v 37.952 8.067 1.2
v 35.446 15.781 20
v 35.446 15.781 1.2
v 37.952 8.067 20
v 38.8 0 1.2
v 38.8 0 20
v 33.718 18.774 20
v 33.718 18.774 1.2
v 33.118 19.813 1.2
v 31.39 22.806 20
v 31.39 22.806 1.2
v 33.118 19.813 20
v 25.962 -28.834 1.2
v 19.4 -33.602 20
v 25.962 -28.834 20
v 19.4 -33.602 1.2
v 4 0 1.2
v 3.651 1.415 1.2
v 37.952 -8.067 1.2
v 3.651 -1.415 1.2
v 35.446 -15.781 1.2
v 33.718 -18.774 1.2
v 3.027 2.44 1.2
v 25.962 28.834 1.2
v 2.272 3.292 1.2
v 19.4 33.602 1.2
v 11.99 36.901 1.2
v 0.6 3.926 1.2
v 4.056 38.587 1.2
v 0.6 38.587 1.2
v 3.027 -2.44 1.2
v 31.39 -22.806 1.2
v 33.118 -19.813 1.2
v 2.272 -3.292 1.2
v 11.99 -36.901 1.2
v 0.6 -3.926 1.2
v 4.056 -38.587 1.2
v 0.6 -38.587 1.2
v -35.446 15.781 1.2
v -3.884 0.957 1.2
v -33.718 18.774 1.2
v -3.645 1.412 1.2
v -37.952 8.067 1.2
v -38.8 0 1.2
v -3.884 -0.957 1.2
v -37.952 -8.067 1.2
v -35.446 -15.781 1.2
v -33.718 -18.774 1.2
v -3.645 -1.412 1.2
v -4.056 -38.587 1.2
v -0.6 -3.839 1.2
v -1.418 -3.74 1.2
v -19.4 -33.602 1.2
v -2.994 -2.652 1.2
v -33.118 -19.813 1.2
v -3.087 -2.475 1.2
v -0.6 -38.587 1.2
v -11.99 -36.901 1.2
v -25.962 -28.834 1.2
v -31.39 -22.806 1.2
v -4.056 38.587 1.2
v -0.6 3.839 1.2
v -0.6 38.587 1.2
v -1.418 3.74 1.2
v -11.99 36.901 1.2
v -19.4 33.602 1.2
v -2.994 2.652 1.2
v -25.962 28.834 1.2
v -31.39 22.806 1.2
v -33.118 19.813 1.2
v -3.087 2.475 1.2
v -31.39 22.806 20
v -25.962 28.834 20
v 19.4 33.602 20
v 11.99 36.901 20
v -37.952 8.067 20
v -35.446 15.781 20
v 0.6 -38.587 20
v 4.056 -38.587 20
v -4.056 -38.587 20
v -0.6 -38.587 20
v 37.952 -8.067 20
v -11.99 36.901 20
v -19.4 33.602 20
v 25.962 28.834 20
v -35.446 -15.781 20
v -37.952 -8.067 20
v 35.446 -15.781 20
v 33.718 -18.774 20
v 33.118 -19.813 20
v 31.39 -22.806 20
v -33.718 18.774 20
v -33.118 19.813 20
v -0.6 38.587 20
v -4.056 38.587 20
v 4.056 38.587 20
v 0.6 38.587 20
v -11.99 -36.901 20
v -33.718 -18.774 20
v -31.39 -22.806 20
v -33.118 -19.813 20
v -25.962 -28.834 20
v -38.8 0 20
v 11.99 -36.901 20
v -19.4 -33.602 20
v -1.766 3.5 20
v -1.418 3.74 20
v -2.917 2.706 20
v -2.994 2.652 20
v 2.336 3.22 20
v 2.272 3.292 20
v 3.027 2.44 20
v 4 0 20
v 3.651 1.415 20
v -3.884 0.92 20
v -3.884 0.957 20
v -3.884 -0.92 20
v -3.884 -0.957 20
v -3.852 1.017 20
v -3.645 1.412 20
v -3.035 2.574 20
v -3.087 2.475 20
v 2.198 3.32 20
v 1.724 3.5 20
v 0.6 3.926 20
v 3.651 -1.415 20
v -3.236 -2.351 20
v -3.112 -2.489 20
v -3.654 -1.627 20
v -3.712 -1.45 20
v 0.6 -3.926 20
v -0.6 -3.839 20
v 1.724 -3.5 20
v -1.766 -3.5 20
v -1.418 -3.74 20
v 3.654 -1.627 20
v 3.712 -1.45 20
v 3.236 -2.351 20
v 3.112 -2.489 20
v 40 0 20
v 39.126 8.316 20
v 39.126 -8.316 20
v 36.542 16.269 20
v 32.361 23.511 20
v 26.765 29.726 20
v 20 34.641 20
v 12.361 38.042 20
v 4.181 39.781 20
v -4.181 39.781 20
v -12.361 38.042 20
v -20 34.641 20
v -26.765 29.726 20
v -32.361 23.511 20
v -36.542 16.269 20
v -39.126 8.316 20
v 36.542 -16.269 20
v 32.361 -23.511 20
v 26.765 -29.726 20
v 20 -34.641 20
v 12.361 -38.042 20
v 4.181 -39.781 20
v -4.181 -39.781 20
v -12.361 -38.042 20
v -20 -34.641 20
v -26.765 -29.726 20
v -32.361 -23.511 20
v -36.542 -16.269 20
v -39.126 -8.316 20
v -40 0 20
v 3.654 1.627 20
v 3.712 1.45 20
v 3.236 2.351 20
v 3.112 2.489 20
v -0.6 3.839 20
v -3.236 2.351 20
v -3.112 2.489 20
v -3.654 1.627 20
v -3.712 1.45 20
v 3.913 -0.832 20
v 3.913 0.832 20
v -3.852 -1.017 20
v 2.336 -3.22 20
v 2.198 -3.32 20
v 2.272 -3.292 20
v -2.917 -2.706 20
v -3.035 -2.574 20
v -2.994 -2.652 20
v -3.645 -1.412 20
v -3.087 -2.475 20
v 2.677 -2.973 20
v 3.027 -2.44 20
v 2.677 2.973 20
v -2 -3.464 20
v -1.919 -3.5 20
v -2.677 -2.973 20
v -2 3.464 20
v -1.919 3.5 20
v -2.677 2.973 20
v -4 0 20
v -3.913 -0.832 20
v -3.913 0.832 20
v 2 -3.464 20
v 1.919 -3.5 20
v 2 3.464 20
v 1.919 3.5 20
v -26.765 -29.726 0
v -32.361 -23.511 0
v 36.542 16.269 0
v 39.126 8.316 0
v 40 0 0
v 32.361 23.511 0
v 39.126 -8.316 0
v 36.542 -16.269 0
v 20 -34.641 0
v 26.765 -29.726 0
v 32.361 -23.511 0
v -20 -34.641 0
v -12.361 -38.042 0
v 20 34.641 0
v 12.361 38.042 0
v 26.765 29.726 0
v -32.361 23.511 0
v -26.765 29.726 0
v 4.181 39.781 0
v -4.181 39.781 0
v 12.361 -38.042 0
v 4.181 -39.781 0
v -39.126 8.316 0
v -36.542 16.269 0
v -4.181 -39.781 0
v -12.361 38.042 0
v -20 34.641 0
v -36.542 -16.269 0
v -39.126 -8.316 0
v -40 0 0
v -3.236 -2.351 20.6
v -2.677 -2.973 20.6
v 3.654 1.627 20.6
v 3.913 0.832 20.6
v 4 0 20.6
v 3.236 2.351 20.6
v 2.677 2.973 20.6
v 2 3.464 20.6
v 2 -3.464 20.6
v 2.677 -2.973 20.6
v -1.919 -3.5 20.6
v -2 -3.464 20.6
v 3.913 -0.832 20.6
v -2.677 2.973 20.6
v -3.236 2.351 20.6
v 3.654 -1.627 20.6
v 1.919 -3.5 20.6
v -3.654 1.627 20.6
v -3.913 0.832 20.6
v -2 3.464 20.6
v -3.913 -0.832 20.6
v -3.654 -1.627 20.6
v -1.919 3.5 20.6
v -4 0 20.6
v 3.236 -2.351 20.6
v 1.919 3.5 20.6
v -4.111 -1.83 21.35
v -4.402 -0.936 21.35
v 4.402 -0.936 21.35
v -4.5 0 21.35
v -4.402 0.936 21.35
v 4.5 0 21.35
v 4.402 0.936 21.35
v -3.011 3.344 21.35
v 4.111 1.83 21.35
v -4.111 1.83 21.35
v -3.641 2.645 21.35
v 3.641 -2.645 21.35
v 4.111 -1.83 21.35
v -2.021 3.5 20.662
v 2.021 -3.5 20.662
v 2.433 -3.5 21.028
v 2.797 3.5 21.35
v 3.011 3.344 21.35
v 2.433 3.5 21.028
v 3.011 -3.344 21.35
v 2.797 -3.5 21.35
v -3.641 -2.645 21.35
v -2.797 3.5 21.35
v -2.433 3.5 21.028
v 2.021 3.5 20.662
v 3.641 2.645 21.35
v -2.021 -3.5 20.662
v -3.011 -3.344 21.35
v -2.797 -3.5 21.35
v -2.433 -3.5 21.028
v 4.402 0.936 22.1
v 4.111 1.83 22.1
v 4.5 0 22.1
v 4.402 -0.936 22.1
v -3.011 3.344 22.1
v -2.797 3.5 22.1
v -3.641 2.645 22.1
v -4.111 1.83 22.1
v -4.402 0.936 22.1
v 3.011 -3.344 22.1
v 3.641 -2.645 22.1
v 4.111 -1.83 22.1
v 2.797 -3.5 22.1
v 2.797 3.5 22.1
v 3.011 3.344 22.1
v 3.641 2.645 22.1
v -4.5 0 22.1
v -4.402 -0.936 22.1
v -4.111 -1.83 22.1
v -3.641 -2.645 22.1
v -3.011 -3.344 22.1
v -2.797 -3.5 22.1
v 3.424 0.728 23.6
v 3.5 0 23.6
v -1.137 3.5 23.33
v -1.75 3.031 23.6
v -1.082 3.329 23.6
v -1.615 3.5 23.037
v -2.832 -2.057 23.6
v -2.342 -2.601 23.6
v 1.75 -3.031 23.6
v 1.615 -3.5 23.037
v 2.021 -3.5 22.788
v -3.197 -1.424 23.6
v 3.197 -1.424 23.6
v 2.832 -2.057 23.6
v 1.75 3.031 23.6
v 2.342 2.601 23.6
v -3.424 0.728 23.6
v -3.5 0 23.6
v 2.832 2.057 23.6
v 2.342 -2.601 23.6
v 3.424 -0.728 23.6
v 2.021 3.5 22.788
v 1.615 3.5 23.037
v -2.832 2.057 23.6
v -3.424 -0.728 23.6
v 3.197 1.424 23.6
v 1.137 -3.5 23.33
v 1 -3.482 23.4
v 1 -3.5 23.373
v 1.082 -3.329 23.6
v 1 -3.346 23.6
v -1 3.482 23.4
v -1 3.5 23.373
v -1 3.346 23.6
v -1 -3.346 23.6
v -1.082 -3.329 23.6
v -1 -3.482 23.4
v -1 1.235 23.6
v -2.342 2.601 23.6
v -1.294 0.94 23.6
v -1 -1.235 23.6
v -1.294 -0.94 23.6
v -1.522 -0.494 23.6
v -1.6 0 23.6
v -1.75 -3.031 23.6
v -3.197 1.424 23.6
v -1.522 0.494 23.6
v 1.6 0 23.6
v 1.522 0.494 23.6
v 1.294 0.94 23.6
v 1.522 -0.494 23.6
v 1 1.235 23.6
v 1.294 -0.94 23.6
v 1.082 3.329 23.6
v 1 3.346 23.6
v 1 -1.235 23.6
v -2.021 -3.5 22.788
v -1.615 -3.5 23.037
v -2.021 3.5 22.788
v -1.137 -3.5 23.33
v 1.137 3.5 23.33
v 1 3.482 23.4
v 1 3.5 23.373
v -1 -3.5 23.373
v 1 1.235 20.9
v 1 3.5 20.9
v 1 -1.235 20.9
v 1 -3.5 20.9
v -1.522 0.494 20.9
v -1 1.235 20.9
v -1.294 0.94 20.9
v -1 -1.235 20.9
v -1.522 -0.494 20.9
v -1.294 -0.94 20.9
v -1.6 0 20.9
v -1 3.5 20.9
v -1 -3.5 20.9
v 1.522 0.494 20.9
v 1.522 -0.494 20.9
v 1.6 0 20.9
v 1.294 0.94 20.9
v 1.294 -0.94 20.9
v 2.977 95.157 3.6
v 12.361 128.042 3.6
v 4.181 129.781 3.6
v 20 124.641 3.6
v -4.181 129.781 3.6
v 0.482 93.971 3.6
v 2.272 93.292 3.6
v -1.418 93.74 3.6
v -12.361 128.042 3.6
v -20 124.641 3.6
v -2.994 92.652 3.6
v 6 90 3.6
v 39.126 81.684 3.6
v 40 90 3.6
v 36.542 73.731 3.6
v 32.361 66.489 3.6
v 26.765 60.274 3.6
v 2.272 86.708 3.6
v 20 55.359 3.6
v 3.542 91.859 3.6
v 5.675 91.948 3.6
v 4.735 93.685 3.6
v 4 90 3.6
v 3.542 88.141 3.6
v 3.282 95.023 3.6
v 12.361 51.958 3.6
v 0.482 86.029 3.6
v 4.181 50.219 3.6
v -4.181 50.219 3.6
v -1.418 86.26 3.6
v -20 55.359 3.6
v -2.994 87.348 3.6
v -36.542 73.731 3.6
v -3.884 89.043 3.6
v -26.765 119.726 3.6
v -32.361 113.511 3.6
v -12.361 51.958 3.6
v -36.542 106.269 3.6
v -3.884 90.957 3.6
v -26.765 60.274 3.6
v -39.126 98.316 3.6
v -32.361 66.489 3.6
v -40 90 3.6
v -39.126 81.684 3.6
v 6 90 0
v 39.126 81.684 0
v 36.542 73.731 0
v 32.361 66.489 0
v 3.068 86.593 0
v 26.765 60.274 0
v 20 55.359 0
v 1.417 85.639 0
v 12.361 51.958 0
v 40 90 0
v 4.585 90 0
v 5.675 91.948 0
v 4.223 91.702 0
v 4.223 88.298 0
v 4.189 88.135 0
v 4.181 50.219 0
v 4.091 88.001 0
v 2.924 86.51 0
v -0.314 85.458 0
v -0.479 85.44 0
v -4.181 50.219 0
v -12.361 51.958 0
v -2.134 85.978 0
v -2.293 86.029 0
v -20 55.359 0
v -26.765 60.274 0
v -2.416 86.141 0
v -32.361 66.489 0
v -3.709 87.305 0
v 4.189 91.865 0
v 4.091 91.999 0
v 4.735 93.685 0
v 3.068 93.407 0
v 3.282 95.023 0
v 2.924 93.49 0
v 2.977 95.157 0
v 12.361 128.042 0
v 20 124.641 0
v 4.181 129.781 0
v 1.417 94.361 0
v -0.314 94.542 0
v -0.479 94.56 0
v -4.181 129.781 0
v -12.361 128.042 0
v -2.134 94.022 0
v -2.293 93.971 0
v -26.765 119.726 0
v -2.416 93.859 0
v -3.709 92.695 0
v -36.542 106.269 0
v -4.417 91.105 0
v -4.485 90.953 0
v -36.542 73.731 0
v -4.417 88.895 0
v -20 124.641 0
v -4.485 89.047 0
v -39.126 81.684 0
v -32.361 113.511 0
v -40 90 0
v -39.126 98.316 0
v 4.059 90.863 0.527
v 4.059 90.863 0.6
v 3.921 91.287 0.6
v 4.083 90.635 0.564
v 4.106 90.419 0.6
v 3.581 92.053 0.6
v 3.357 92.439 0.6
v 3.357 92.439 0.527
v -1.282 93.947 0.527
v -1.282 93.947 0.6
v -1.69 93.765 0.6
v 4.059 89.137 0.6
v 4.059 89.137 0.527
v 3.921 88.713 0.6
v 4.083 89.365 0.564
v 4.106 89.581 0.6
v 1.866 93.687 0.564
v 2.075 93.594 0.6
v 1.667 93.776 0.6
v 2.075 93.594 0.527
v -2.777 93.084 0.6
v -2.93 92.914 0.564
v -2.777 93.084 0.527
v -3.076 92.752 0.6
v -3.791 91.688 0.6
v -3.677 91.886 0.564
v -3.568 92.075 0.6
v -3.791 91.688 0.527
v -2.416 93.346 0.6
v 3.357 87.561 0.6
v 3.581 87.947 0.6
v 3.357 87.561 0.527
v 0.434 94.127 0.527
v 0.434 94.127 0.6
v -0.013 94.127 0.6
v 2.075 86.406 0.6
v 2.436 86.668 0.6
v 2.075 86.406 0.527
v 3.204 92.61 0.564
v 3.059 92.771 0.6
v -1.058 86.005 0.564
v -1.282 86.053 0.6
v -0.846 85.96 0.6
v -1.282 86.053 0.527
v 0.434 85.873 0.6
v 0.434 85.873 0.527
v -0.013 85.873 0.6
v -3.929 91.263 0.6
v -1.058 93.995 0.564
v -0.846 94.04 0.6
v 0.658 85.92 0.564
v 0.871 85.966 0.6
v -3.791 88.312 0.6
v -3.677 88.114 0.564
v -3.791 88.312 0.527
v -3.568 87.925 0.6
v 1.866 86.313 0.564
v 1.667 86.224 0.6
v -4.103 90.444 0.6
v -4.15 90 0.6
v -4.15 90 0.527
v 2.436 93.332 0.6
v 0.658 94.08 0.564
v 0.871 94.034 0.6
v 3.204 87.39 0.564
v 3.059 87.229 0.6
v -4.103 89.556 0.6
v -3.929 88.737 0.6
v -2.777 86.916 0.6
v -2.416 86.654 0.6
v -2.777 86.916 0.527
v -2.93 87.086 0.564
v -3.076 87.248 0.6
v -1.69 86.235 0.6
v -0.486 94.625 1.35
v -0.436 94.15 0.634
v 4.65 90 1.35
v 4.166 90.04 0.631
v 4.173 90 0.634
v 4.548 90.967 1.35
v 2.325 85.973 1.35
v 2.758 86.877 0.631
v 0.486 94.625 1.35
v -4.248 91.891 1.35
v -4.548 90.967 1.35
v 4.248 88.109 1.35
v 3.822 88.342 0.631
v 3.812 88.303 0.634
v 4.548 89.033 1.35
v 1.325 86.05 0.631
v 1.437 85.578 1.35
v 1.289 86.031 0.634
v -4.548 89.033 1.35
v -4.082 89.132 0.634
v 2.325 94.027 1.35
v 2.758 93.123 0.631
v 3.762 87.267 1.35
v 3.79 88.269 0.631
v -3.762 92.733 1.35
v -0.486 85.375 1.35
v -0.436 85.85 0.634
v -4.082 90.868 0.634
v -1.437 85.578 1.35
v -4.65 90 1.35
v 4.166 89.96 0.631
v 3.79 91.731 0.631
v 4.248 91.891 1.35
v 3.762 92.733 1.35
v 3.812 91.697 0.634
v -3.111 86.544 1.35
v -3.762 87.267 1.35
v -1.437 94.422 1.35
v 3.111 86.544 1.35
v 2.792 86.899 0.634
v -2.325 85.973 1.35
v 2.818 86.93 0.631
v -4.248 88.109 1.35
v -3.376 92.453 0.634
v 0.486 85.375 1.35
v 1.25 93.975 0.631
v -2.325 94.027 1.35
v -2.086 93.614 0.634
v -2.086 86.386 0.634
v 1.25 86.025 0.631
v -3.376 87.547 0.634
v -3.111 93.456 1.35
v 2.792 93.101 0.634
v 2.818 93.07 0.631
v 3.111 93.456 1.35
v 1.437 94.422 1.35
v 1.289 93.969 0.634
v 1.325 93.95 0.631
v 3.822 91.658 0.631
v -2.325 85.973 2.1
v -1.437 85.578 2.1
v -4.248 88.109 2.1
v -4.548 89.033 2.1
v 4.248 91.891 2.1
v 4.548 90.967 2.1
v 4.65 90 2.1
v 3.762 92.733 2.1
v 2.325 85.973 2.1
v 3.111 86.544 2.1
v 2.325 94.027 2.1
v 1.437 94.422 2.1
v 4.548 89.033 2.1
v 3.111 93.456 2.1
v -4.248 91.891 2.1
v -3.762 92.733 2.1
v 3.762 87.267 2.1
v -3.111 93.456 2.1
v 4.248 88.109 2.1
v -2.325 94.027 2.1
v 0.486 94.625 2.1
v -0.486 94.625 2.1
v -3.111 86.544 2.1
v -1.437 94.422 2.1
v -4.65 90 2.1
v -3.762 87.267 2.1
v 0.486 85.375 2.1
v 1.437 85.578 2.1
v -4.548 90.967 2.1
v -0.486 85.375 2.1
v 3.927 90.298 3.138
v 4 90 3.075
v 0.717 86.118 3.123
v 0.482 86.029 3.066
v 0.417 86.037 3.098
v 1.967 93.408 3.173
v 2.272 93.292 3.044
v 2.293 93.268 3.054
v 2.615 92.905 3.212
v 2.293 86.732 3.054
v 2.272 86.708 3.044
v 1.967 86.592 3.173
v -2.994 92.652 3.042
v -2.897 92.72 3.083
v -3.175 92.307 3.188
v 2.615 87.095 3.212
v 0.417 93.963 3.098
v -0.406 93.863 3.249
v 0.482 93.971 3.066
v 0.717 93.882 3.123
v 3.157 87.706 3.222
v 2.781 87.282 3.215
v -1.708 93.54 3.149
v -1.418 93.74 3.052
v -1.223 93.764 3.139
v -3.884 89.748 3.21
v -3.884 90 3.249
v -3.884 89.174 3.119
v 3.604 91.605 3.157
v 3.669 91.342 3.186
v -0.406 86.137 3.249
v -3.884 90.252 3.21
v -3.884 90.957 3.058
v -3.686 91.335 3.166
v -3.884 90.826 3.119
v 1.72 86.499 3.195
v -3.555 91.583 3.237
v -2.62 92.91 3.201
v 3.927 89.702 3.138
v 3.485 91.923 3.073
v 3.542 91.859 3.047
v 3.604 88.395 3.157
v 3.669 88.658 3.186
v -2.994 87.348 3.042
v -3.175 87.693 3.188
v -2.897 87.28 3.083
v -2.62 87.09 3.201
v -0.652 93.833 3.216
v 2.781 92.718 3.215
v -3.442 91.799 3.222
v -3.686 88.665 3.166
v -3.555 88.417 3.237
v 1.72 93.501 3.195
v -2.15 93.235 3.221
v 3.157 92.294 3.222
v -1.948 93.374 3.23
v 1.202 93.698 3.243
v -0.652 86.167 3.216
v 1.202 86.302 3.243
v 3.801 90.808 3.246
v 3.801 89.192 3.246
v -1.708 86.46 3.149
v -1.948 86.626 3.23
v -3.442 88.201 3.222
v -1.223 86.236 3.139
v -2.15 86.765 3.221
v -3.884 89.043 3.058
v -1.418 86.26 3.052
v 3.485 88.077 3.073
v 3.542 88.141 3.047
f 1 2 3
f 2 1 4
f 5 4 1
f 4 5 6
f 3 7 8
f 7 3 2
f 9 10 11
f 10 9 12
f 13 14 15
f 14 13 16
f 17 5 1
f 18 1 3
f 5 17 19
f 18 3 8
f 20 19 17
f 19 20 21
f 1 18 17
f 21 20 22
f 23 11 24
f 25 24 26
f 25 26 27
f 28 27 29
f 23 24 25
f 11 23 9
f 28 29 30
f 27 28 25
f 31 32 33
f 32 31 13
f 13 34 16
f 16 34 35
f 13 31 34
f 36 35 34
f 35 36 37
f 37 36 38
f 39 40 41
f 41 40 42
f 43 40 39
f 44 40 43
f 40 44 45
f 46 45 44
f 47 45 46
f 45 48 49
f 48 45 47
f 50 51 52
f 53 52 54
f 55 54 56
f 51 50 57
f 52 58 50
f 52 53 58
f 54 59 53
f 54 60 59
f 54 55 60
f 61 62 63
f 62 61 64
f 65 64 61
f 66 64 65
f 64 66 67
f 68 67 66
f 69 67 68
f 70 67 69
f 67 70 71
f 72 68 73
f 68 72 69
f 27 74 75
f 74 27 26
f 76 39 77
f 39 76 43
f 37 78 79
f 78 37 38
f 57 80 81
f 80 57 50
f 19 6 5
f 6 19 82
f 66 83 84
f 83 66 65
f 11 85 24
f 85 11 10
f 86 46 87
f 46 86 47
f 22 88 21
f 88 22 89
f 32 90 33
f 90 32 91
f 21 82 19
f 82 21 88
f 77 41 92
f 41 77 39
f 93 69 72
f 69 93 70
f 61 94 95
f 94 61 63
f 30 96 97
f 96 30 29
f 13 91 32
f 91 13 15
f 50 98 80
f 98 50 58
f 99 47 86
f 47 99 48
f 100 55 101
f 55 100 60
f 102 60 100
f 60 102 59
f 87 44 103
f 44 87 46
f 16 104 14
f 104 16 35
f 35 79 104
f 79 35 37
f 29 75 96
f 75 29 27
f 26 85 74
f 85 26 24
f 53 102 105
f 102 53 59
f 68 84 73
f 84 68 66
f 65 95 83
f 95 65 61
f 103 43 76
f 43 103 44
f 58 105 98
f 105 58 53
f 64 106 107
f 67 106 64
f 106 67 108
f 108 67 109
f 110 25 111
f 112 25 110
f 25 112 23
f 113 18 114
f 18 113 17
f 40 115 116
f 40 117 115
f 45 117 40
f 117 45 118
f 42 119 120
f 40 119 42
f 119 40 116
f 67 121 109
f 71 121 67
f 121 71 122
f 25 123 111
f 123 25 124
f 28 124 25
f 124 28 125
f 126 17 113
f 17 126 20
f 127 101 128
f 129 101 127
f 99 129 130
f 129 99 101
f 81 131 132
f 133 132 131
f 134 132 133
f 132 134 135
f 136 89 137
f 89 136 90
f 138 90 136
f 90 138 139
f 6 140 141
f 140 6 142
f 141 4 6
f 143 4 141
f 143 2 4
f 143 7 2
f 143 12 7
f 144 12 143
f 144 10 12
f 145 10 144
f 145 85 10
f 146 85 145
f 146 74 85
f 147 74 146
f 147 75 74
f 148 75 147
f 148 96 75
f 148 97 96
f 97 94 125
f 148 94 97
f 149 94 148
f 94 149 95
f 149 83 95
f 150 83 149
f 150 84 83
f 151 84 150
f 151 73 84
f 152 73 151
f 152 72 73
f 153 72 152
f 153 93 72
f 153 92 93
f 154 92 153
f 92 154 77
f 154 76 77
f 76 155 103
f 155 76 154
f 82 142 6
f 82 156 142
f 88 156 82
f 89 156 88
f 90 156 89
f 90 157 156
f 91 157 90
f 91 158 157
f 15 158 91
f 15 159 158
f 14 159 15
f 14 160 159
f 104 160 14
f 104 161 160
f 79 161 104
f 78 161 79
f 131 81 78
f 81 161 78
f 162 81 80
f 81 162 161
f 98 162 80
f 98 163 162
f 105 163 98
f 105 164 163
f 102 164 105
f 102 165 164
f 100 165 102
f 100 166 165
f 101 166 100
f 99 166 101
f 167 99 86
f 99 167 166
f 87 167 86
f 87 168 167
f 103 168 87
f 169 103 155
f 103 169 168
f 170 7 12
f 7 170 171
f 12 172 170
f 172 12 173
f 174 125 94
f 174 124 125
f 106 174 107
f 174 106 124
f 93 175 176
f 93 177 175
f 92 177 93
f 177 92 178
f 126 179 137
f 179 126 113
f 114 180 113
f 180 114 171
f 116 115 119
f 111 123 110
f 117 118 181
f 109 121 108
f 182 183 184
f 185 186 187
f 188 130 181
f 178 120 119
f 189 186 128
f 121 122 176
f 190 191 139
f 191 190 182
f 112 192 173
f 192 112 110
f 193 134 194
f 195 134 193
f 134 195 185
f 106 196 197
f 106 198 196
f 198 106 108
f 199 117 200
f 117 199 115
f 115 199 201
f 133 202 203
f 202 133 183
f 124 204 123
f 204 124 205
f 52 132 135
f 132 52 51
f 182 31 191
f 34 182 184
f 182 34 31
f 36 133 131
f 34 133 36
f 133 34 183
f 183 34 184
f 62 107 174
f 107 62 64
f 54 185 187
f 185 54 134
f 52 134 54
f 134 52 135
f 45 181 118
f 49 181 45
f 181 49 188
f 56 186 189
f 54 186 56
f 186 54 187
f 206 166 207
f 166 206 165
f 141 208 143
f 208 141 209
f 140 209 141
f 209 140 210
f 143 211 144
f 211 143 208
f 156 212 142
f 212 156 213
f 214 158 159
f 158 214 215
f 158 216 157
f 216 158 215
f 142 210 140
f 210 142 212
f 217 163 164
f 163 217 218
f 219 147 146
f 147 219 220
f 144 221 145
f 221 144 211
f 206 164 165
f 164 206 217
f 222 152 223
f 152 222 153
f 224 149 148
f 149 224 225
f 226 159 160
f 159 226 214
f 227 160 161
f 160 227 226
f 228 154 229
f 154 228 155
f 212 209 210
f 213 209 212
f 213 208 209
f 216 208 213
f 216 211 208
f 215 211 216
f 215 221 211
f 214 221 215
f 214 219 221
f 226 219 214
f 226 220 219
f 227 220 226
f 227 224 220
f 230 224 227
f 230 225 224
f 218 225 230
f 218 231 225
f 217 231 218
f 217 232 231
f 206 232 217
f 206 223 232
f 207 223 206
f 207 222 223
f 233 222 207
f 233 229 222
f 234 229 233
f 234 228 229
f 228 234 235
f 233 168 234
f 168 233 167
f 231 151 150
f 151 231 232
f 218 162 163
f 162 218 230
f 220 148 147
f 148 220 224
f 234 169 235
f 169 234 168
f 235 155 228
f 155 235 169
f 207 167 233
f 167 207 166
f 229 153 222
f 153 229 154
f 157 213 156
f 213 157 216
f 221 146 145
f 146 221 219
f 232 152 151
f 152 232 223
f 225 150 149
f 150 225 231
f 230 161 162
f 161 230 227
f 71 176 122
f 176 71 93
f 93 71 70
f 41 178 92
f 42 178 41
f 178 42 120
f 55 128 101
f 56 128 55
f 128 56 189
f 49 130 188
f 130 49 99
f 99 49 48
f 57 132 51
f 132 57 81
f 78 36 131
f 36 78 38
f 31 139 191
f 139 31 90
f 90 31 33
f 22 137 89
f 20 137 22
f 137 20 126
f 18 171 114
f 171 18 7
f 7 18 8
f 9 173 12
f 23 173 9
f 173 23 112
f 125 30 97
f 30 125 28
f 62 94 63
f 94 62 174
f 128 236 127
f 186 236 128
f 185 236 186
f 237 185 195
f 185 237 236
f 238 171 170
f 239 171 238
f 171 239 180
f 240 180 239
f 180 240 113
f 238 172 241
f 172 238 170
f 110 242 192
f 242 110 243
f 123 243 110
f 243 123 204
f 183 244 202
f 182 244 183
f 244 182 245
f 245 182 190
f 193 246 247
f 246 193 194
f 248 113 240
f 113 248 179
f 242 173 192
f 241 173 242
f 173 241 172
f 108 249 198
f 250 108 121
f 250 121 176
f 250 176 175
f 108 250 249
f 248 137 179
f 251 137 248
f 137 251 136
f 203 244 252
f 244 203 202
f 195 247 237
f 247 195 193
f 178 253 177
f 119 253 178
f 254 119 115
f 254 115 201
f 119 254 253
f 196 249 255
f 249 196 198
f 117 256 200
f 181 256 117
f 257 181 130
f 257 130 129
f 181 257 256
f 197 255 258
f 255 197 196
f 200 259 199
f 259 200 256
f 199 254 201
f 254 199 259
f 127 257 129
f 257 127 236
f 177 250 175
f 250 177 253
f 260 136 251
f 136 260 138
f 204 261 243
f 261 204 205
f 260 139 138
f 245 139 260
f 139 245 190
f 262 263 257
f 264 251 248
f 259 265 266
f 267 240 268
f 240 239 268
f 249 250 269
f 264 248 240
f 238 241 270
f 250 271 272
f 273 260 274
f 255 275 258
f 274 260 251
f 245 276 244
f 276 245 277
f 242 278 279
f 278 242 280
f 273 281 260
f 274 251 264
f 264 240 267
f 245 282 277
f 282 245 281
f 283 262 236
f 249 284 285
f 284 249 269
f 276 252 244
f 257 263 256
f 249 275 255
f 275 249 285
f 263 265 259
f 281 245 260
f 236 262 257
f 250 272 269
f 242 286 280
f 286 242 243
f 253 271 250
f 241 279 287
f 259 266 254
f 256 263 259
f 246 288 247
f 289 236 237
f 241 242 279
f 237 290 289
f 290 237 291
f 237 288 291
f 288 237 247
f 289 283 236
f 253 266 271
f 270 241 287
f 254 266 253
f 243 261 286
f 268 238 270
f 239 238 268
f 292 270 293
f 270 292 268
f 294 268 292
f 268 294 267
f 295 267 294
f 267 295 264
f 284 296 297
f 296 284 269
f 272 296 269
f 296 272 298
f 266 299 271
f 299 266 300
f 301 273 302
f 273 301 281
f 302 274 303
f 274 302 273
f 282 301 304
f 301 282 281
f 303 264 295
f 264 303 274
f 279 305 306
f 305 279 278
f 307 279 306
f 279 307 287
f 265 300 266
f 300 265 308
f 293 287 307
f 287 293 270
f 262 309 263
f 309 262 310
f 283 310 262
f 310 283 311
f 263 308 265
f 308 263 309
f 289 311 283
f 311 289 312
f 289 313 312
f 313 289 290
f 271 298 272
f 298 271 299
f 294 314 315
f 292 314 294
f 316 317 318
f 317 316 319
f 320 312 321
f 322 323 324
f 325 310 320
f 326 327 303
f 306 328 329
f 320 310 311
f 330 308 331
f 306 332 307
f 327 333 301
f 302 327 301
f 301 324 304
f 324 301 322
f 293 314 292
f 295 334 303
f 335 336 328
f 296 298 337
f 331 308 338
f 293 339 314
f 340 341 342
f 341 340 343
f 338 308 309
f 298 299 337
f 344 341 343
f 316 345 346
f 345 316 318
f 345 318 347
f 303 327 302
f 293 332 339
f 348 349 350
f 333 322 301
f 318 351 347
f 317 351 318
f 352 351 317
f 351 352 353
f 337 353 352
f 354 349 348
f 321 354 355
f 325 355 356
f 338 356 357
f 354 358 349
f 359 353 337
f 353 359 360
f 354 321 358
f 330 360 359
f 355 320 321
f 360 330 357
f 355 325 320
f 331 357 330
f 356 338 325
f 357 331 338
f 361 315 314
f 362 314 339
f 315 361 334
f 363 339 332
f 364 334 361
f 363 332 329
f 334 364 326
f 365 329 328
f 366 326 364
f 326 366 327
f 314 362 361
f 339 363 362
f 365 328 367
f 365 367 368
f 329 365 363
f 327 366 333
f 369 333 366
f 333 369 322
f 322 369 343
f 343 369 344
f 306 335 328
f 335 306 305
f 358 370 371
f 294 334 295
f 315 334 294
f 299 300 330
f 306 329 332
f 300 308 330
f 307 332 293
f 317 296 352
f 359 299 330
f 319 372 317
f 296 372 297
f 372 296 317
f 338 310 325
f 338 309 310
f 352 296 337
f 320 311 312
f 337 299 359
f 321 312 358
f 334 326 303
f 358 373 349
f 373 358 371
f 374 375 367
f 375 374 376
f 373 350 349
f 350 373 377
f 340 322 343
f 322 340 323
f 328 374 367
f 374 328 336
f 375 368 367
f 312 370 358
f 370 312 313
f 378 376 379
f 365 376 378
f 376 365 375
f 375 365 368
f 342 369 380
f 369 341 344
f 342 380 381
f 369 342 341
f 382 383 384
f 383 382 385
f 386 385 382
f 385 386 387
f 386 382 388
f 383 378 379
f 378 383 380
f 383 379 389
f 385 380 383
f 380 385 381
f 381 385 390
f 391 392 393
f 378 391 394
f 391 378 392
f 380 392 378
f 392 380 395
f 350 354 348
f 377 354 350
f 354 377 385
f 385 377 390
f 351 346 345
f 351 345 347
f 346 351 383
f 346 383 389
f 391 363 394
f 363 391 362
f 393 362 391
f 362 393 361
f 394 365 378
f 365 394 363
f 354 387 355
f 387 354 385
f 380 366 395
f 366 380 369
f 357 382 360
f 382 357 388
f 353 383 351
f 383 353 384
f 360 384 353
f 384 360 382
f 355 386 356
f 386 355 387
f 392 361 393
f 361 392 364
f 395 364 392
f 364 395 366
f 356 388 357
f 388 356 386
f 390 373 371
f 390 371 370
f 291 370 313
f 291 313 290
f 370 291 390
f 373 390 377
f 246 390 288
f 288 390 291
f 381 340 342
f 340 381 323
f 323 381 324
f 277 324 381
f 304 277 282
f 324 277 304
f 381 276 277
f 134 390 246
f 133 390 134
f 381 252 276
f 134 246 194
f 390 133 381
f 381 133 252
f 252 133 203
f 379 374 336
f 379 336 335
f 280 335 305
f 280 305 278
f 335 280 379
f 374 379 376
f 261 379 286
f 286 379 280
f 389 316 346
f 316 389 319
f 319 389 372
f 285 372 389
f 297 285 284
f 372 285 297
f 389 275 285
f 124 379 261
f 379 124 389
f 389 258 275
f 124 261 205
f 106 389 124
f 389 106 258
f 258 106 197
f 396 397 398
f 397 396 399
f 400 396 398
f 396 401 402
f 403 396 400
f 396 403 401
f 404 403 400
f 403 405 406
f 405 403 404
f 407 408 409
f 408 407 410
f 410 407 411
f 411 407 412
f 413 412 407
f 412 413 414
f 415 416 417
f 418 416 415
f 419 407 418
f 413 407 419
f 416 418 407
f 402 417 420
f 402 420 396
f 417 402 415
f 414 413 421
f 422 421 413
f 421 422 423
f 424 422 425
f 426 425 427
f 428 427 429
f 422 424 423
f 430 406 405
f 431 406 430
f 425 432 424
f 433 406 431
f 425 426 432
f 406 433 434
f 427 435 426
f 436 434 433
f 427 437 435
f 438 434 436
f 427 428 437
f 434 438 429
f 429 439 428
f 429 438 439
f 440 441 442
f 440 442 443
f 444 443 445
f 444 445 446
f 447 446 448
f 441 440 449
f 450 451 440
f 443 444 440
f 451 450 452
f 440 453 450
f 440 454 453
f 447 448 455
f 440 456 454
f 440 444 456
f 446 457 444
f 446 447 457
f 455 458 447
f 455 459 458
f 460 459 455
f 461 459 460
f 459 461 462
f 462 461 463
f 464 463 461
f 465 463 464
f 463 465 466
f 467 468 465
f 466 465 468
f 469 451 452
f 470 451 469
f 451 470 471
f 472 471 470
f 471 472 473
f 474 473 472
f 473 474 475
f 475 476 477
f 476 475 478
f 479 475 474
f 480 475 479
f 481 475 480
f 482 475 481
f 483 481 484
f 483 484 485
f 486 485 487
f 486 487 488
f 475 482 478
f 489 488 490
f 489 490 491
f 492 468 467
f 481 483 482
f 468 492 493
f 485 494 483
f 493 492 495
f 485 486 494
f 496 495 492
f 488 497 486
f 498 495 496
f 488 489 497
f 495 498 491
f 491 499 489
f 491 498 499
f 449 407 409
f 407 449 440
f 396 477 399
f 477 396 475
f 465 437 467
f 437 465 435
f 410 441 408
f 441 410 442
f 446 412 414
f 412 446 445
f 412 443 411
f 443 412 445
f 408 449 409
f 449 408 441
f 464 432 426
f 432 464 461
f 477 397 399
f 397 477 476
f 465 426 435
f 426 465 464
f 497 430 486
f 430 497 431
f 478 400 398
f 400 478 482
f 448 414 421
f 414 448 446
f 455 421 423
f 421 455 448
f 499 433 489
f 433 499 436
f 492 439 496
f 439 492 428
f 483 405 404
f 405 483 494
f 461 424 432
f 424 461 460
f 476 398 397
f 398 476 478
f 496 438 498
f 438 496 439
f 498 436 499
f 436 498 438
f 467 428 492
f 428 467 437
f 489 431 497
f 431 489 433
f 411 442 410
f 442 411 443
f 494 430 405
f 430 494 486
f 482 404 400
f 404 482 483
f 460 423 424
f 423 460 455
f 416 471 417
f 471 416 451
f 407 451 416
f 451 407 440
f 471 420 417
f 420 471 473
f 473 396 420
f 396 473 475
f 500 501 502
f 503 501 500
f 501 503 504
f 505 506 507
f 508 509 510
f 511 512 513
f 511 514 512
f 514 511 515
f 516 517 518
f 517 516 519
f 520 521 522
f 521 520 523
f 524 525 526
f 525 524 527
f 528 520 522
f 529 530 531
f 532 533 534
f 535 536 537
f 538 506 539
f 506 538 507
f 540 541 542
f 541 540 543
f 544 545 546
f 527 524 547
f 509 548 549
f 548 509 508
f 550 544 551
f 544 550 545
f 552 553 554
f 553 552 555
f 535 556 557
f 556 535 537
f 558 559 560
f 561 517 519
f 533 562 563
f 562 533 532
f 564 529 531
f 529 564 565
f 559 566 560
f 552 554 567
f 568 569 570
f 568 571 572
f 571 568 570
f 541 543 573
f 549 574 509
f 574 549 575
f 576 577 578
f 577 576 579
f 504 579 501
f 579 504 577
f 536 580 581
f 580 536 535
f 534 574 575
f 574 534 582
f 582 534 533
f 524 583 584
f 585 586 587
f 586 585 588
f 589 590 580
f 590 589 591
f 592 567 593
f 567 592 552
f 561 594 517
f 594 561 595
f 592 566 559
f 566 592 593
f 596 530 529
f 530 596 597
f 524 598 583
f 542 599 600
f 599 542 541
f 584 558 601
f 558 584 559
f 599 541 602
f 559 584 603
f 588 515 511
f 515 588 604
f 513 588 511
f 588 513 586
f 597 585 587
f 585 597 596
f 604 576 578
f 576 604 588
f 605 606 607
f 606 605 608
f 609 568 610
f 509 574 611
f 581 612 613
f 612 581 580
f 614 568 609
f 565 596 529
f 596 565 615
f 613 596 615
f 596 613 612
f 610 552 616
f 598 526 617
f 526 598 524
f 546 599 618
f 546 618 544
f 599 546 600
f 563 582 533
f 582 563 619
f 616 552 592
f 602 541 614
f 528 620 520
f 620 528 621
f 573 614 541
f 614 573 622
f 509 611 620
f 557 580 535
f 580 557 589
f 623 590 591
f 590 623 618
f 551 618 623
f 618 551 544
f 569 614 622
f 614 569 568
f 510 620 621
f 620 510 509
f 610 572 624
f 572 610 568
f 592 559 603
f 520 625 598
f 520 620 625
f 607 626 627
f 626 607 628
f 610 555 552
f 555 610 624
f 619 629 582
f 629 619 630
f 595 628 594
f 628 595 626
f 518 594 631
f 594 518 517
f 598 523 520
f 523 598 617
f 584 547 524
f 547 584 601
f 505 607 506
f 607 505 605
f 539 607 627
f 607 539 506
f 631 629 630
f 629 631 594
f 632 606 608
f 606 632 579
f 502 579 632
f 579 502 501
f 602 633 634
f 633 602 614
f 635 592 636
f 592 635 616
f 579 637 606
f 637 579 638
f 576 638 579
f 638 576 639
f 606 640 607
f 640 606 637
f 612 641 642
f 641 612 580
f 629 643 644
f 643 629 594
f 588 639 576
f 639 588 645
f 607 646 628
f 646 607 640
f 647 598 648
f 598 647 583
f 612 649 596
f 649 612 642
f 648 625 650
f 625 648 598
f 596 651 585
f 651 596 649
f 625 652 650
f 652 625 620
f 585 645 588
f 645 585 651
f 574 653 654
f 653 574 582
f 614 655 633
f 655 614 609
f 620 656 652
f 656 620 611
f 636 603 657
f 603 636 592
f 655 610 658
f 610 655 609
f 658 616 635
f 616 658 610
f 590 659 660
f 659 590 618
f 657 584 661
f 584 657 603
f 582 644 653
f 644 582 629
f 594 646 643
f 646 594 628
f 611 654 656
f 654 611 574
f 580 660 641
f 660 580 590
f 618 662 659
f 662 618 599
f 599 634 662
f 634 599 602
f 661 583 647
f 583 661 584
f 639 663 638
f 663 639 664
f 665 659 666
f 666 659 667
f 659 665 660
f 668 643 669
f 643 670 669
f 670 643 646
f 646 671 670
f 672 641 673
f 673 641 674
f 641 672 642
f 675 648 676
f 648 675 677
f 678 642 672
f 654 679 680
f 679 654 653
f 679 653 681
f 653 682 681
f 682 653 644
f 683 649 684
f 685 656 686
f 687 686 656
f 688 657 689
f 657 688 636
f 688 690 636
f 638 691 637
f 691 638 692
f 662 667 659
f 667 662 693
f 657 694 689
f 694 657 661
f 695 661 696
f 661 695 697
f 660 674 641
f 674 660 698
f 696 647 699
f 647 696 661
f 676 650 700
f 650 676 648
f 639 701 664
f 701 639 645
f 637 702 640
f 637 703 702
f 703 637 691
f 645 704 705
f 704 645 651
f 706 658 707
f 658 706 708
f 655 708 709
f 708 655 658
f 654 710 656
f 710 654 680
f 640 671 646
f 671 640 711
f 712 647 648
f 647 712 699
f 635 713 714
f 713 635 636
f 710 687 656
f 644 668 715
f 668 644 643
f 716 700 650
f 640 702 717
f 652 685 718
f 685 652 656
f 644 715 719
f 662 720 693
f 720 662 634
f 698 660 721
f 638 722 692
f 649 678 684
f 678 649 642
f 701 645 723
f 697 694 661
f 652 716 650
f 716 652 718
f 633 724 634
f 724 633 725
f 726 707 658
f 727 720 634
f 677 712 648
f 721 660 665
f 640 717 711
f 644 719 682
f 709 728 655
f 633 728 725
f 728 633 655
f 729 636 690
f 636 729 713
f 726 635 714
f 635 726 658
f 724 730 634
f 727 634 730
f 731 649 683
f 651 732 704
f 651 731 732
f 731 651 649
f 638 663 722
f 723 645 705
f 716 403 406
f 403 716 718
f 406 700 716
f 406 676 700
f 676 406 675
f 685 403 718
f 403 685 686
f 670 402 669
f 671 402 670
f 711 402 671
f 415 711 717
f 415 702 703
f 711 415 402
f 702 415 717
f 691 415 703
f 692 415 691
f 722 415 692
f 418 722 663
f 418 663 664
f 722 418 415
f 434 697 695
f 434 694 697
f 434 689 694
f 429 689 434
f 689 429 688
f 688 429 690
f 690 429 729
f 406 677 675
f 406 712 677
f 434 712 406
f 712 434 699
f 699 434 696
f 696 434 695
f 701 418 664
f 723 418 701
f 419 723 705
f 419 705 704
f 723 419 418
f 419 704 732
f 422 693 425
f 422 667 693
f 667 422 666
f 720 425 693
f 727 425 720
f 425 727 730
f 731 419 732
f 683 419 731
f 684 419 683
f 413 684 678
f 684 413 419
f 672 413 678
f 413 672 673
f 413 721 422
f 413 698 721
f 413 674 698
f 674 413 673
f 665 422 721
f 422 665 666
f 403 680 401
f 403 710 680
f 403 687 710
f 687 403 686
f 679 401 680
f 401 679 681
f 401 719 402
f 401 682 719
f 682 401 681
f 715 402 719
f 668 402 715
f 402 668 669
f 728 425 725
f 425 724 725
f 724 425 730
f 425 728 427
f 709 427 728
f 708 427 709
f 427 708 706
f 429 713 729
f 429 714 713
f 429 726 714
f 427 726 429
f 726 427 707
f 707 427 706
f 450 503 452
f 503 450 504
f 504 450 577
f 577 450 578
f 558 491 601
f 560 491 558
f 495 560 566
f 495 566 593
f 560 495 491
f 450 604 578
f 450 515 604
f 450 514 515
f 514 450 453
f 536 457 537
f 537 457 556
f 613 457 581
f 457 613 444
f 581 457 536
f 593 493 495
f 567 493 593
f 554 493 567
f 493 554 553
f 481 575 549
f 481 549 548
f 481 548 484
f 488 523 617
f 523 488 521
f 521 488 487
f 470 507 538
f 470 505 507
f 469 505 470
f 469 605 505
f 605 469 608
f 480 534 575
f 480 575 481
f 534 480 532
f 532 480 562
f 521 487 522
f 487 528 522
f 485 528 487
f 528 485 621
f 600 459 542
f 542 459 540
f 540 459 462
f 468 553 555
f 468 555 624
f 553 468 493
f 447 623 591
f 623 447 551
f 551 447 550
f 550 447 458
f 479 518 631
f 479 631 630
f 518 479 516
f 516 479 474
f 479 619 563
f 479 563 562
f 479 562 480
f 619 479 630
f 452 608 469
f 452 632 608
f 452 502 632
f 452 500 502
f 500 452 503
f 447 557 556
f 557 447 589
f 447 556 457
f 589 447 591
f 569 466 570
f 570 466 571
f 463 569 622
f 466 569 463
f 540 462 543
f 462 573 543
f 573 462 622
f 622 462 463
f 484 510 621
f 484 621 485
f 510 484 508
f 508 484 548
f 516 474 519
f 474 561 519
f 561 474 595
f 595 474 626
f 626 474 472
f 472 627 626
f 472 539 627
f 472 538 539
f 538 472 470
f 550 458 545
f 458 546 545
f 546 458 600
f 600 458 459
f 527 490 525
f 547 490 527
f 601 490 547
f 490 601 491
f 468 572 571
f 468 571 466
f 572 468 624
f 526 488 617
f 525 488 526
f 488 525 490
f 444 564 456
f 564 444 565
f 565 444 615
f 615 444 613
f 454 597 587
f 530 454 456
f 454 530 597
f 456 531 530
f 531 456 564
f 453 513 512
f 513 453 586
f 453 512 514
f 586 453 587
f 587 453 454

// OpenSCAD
//include <pins.scad>;

// Parametric round box by camperking v0.2
// http://www.thingiverse.com/thing:12134
// added option to screw the lid with a M3 screw
// improved thickness of the pin connectors
// usage is round_box(diameter, height, sections, wall_thickness, pin)
// diameter - is the diameter of your box
// height - defines the height of the box
// sections - how many sections you want
// wall_thickness - define your wallthickness, the pins height is 3 times the wallthickness
// pin - set to true if you want tbusers pin connector for the lid, set to false if you want to mount the lidwith a M3 screw
//
//usage for the lid is round_box_cover(diameter, sections, wall_thickness, pin)
// wall_thickness - this should be same value you have used at the box because the pinhole and pin height are calculated with this
//
//uncomment the following lines to test
//round_box(80, 20, 6, 1.2, true);
//round_box_cover(80, 6, 1.2, true);


/* [Global] */
part = "both"; // [first:Round Box only,second:Lid only,both:Box and lid]

Diameter = 80; // [10:250]
Height = 20; // [5:120]
Number_of_Sections = 6; // [0:32]
Pin_or_Hole = "Pin"; // [Pin, Hole]

/* [Hidden] */
diameter = Diameter;
height = Height;
sections = Number_of_Sections;
wall_thickness = 1.2;
pin = Pin_or_Hole;


if (part == "first") {
		round_box(diameter, height, sections, wall_thickness, pin);
	} else if (part == "second") {
		round_box_cover(diameter, sections, wall_thickness, pin);
	} else if (part == "both") {
      round_box(diameter, height, sections, wall_thickness, pin);
		translate([0, diameter+10, 0]) round_box_cover(diameter, sections, wall_thickness, pin);
	} else {
		both();
	}

module round_box(diameter, height, sections, wall_thickness, pin) {
	difference() {
		cylinder(h=height, r=diameter/2);
		if (pin == "Hole") {
			cylinder(h=height, r=1.25);
		}
		difference() {
			translate([0, 0, wall_thickness]) cylinder(h=height, r=diameter/2-wall_thickness);
			cylinder(h=height, r=4);
		}
		
	}
	for(i=[1:sections]) {
		rotate([0, 0, i * 360/sections]) translate([-wall_thickness/2, wall_thickness*2, 0]) cube([wall_thickness, diameter/2-wall_thickness*3, height]);
	}
	if (pin == "Pin") {
		translate([0, 0, height]) pin(h=wall_thickness*3);
	} 
}

module round_box_cover(diameter, sections, wall_thickness, pin) {
	difference() { union() {
		difference() {
			cylinder(h=wall_thickness*3, r=diameter/2);		
			difference() {
				cube([diameter, diameter, wall_thickness*3]);
				rotate([0, 0, 360/sections]) cube([diameter, diameter, wall_thickness*3]);
			}
		} 
			cylinder(h=wall_thickness*3, r=6);
		}
		if (pin == "Pin") {
			pinhole(h=wall_thickness*3);
		} else {
			cylinder(h=wall_thickness*3, r=1.5);
		}
	}
}





///////////////////////////////////////////////////////////////////////////
// Pin Connectors V2
// Tony Buser <tbuser@gmail.com>

// pinhole(h=5);

// test();
// pintack(h=10);
// pinpeg(h=20);

module test() {
  tolerance = 0.3;
  
  translate([-12, 12, 0]) pinpeg(h=20);
  translate([12, 12, 0]) pintack(h=10);
  
  difference() {
    union() {
      translate([0, -12, 2.5]) cube(size = [59, 20, 5], center = true);
      translate([24, -12, 7.5]) cube(size = [12, 20, 15], center = true);
    }
    translate([-24, -12, 0]) pinhole(h=5, t=tolerance);
    translate([-12, -12, 0]) pinhole(h=5, t=tolerance, tight=false);
    translate([0, -12, 0]) pinhole(h=10, t=tolerance);
    translate([12, -12, 0]) pinhole(h=10, t=tolerance, tight=false);
    translate([24, -12, 15]) rotate([0, 180, 0]) pinhole(h=10, t=tolerance);
  }
}

module pinhole(h=10, r=4, lh=3, lt=1, t=0.3, tight=true) {
  // h = shaft height
  // r = shaft radius
  // lh = lip height
  // lt = lip thickness
  // t = tolerance
  // tight = set to false if you want a joint that spins easily
  
  union() {
    pin_solid(h, r+(t/2), lh, lt);
    cylinder(h=h+0.2, r=r);
    // widen the cylinder slightly
    // cylinder(h=h+0.2, r=r+(t-0.2/2));
    if (tight == false) {
      cylinder(h=h+0.2, r=r+(t/2)+0.25);
    }
    // widen the entrance hole to make insertion easier
    translate([0, 0, -0.1]) cylinder(h=lh/3, r2=r, r1=r+(t/2)+(lt/2));
  }
}

module pin(h=10, r=4, lh=3, lt=1, side=false) {
  // h = shaft height
  // r = shaft radius
  // lh = lip height
  // lt = lip thickness
  // side = set to true if you want it printed horizontally

  if (side) {
    pin_horizontal(h, r, lh, lt);
  } else {
    pin_vertical(h, r, lh, lt);
  }
}

module pintack(h=10, r=4, lh=3, lt=1, bh=3, br=8.75) {
  // bh = base_height
  // br = base_radius
  
  union() {
    cylinder(h=bh, r=br);
    translate([0, 0, bh]) pin(h, r, lh, lt);
  }
}

module pinpeg(h=20, r=4, lh=3, lt=1) {
  union() {
    translate([0, -h/4+0.05, 0]) pin(h/2+0.1, r, lh, lt, side=true);
    translate([0, h/4-0.05, 0]) rotate([0, 0, 180]) pin(h/2+0.1, r, lh, lt, side=true);
  }
}

// just call pin instead, I made this module because it was easier to do the rotation option this way
// since openscad complains of recursion if I did it all in one module
module pin_vertical(h=10, r=4, lh=3, lt=1) {
  // h = shaft height
  // r = shaft radius
  // lh = lip height
  // lt = lip thickness

  difference() {
    pin_solid(h, r, lh, lt);
    
    // center cut
    translate([-r*0.5/2, -(r*2+lt*2)/2, h/4]) cube([r*0.5, r*2+lt*2, h]);
    translate([0, 0, h/4]) cylinder(h=h+lh, r=r/2.5, $fn=20);
    // center curve
    // translate([0, 0, h/4]) rotate([90, 0, 0]) cylinder(h=r*2, r=r*0.5/2, center=true, $fn=20);
  
    // side cuts
    translate([-r*2, -lt-r*1.125, -1]) cube([r*4, lt*2, h+2]);
    translate([-r*2, -lt+r*1.125, -1]) cube([r*4, lt*2, h+2]);
  }
}

// call pin with side=true instead of this
module pin_horizontal(h=10, r=4, lh=3, lt=1) {
  // h = shaft height
  // r = shaft radius
  // lh = lip height
  // lt = lip thickness
  translate([0, h/2, r*1.125-lt]) rotate([90, 0, 0]) pin_vertical(h, r, lh, lt);
}

// this is mainly to make the pinhole module easier
module pin_solid(h=10, r=4, lh=3, lt=1) {
  union() {
    // shaft
    cylinder(h=h-lh, r=r, $fn=30);
    // lip
    // translate([0, 0, h-lh]) cylinder(h=lh*0.25, r1=r, r2=r+(lt/2), $fn=30);
    // translate([0, 0, h-lh+lh*0.25]) cylinder(h=lh*0.25, r2=r, r1=r+(lt/2), $fn=30);
    // translate([0, 0, h-lh+lh*0.50]) cylinder(h=lh*0.50, r1=r, r2=r-(lt/2), $fn=30);

    // translate([0, 0, h-lh]) cylinder(h=lh*0.50, r1=r, r2=r+(lt/2), $fn=30);
    // translate([0, 0, h-lh+lh*0.50]) cylinder(h=lh*0.50, r1=r+(lt/2), r2=r-(lt/3), $fn=30);    

    translate([0, 0, h-lh]) cylinder(h=lh*0.25, r1=r, r2=r+(lt/2), $fn=30);
    translate([0, 0, h-lh+lh*0.25]) cylinder(h=lh*0.25, r=r+(lt/2), $fn=30);    
    translate([0, 0, h-lh+lh*0.50]) cylinder(h=lh*0.50, r1=r+(lt/2), r2=r-(lt/2), $fn=30);    

    // translate([0, 0, h-lh]) cylinder(h=lh, r1=r+(lt/2), r2=1, $fn=30);
    // translate([0, 0, h-lh-lt/2]) cylinder(h=lt/2, r1=r, r2=r+(lt/2), $fn=30);
  }
}
